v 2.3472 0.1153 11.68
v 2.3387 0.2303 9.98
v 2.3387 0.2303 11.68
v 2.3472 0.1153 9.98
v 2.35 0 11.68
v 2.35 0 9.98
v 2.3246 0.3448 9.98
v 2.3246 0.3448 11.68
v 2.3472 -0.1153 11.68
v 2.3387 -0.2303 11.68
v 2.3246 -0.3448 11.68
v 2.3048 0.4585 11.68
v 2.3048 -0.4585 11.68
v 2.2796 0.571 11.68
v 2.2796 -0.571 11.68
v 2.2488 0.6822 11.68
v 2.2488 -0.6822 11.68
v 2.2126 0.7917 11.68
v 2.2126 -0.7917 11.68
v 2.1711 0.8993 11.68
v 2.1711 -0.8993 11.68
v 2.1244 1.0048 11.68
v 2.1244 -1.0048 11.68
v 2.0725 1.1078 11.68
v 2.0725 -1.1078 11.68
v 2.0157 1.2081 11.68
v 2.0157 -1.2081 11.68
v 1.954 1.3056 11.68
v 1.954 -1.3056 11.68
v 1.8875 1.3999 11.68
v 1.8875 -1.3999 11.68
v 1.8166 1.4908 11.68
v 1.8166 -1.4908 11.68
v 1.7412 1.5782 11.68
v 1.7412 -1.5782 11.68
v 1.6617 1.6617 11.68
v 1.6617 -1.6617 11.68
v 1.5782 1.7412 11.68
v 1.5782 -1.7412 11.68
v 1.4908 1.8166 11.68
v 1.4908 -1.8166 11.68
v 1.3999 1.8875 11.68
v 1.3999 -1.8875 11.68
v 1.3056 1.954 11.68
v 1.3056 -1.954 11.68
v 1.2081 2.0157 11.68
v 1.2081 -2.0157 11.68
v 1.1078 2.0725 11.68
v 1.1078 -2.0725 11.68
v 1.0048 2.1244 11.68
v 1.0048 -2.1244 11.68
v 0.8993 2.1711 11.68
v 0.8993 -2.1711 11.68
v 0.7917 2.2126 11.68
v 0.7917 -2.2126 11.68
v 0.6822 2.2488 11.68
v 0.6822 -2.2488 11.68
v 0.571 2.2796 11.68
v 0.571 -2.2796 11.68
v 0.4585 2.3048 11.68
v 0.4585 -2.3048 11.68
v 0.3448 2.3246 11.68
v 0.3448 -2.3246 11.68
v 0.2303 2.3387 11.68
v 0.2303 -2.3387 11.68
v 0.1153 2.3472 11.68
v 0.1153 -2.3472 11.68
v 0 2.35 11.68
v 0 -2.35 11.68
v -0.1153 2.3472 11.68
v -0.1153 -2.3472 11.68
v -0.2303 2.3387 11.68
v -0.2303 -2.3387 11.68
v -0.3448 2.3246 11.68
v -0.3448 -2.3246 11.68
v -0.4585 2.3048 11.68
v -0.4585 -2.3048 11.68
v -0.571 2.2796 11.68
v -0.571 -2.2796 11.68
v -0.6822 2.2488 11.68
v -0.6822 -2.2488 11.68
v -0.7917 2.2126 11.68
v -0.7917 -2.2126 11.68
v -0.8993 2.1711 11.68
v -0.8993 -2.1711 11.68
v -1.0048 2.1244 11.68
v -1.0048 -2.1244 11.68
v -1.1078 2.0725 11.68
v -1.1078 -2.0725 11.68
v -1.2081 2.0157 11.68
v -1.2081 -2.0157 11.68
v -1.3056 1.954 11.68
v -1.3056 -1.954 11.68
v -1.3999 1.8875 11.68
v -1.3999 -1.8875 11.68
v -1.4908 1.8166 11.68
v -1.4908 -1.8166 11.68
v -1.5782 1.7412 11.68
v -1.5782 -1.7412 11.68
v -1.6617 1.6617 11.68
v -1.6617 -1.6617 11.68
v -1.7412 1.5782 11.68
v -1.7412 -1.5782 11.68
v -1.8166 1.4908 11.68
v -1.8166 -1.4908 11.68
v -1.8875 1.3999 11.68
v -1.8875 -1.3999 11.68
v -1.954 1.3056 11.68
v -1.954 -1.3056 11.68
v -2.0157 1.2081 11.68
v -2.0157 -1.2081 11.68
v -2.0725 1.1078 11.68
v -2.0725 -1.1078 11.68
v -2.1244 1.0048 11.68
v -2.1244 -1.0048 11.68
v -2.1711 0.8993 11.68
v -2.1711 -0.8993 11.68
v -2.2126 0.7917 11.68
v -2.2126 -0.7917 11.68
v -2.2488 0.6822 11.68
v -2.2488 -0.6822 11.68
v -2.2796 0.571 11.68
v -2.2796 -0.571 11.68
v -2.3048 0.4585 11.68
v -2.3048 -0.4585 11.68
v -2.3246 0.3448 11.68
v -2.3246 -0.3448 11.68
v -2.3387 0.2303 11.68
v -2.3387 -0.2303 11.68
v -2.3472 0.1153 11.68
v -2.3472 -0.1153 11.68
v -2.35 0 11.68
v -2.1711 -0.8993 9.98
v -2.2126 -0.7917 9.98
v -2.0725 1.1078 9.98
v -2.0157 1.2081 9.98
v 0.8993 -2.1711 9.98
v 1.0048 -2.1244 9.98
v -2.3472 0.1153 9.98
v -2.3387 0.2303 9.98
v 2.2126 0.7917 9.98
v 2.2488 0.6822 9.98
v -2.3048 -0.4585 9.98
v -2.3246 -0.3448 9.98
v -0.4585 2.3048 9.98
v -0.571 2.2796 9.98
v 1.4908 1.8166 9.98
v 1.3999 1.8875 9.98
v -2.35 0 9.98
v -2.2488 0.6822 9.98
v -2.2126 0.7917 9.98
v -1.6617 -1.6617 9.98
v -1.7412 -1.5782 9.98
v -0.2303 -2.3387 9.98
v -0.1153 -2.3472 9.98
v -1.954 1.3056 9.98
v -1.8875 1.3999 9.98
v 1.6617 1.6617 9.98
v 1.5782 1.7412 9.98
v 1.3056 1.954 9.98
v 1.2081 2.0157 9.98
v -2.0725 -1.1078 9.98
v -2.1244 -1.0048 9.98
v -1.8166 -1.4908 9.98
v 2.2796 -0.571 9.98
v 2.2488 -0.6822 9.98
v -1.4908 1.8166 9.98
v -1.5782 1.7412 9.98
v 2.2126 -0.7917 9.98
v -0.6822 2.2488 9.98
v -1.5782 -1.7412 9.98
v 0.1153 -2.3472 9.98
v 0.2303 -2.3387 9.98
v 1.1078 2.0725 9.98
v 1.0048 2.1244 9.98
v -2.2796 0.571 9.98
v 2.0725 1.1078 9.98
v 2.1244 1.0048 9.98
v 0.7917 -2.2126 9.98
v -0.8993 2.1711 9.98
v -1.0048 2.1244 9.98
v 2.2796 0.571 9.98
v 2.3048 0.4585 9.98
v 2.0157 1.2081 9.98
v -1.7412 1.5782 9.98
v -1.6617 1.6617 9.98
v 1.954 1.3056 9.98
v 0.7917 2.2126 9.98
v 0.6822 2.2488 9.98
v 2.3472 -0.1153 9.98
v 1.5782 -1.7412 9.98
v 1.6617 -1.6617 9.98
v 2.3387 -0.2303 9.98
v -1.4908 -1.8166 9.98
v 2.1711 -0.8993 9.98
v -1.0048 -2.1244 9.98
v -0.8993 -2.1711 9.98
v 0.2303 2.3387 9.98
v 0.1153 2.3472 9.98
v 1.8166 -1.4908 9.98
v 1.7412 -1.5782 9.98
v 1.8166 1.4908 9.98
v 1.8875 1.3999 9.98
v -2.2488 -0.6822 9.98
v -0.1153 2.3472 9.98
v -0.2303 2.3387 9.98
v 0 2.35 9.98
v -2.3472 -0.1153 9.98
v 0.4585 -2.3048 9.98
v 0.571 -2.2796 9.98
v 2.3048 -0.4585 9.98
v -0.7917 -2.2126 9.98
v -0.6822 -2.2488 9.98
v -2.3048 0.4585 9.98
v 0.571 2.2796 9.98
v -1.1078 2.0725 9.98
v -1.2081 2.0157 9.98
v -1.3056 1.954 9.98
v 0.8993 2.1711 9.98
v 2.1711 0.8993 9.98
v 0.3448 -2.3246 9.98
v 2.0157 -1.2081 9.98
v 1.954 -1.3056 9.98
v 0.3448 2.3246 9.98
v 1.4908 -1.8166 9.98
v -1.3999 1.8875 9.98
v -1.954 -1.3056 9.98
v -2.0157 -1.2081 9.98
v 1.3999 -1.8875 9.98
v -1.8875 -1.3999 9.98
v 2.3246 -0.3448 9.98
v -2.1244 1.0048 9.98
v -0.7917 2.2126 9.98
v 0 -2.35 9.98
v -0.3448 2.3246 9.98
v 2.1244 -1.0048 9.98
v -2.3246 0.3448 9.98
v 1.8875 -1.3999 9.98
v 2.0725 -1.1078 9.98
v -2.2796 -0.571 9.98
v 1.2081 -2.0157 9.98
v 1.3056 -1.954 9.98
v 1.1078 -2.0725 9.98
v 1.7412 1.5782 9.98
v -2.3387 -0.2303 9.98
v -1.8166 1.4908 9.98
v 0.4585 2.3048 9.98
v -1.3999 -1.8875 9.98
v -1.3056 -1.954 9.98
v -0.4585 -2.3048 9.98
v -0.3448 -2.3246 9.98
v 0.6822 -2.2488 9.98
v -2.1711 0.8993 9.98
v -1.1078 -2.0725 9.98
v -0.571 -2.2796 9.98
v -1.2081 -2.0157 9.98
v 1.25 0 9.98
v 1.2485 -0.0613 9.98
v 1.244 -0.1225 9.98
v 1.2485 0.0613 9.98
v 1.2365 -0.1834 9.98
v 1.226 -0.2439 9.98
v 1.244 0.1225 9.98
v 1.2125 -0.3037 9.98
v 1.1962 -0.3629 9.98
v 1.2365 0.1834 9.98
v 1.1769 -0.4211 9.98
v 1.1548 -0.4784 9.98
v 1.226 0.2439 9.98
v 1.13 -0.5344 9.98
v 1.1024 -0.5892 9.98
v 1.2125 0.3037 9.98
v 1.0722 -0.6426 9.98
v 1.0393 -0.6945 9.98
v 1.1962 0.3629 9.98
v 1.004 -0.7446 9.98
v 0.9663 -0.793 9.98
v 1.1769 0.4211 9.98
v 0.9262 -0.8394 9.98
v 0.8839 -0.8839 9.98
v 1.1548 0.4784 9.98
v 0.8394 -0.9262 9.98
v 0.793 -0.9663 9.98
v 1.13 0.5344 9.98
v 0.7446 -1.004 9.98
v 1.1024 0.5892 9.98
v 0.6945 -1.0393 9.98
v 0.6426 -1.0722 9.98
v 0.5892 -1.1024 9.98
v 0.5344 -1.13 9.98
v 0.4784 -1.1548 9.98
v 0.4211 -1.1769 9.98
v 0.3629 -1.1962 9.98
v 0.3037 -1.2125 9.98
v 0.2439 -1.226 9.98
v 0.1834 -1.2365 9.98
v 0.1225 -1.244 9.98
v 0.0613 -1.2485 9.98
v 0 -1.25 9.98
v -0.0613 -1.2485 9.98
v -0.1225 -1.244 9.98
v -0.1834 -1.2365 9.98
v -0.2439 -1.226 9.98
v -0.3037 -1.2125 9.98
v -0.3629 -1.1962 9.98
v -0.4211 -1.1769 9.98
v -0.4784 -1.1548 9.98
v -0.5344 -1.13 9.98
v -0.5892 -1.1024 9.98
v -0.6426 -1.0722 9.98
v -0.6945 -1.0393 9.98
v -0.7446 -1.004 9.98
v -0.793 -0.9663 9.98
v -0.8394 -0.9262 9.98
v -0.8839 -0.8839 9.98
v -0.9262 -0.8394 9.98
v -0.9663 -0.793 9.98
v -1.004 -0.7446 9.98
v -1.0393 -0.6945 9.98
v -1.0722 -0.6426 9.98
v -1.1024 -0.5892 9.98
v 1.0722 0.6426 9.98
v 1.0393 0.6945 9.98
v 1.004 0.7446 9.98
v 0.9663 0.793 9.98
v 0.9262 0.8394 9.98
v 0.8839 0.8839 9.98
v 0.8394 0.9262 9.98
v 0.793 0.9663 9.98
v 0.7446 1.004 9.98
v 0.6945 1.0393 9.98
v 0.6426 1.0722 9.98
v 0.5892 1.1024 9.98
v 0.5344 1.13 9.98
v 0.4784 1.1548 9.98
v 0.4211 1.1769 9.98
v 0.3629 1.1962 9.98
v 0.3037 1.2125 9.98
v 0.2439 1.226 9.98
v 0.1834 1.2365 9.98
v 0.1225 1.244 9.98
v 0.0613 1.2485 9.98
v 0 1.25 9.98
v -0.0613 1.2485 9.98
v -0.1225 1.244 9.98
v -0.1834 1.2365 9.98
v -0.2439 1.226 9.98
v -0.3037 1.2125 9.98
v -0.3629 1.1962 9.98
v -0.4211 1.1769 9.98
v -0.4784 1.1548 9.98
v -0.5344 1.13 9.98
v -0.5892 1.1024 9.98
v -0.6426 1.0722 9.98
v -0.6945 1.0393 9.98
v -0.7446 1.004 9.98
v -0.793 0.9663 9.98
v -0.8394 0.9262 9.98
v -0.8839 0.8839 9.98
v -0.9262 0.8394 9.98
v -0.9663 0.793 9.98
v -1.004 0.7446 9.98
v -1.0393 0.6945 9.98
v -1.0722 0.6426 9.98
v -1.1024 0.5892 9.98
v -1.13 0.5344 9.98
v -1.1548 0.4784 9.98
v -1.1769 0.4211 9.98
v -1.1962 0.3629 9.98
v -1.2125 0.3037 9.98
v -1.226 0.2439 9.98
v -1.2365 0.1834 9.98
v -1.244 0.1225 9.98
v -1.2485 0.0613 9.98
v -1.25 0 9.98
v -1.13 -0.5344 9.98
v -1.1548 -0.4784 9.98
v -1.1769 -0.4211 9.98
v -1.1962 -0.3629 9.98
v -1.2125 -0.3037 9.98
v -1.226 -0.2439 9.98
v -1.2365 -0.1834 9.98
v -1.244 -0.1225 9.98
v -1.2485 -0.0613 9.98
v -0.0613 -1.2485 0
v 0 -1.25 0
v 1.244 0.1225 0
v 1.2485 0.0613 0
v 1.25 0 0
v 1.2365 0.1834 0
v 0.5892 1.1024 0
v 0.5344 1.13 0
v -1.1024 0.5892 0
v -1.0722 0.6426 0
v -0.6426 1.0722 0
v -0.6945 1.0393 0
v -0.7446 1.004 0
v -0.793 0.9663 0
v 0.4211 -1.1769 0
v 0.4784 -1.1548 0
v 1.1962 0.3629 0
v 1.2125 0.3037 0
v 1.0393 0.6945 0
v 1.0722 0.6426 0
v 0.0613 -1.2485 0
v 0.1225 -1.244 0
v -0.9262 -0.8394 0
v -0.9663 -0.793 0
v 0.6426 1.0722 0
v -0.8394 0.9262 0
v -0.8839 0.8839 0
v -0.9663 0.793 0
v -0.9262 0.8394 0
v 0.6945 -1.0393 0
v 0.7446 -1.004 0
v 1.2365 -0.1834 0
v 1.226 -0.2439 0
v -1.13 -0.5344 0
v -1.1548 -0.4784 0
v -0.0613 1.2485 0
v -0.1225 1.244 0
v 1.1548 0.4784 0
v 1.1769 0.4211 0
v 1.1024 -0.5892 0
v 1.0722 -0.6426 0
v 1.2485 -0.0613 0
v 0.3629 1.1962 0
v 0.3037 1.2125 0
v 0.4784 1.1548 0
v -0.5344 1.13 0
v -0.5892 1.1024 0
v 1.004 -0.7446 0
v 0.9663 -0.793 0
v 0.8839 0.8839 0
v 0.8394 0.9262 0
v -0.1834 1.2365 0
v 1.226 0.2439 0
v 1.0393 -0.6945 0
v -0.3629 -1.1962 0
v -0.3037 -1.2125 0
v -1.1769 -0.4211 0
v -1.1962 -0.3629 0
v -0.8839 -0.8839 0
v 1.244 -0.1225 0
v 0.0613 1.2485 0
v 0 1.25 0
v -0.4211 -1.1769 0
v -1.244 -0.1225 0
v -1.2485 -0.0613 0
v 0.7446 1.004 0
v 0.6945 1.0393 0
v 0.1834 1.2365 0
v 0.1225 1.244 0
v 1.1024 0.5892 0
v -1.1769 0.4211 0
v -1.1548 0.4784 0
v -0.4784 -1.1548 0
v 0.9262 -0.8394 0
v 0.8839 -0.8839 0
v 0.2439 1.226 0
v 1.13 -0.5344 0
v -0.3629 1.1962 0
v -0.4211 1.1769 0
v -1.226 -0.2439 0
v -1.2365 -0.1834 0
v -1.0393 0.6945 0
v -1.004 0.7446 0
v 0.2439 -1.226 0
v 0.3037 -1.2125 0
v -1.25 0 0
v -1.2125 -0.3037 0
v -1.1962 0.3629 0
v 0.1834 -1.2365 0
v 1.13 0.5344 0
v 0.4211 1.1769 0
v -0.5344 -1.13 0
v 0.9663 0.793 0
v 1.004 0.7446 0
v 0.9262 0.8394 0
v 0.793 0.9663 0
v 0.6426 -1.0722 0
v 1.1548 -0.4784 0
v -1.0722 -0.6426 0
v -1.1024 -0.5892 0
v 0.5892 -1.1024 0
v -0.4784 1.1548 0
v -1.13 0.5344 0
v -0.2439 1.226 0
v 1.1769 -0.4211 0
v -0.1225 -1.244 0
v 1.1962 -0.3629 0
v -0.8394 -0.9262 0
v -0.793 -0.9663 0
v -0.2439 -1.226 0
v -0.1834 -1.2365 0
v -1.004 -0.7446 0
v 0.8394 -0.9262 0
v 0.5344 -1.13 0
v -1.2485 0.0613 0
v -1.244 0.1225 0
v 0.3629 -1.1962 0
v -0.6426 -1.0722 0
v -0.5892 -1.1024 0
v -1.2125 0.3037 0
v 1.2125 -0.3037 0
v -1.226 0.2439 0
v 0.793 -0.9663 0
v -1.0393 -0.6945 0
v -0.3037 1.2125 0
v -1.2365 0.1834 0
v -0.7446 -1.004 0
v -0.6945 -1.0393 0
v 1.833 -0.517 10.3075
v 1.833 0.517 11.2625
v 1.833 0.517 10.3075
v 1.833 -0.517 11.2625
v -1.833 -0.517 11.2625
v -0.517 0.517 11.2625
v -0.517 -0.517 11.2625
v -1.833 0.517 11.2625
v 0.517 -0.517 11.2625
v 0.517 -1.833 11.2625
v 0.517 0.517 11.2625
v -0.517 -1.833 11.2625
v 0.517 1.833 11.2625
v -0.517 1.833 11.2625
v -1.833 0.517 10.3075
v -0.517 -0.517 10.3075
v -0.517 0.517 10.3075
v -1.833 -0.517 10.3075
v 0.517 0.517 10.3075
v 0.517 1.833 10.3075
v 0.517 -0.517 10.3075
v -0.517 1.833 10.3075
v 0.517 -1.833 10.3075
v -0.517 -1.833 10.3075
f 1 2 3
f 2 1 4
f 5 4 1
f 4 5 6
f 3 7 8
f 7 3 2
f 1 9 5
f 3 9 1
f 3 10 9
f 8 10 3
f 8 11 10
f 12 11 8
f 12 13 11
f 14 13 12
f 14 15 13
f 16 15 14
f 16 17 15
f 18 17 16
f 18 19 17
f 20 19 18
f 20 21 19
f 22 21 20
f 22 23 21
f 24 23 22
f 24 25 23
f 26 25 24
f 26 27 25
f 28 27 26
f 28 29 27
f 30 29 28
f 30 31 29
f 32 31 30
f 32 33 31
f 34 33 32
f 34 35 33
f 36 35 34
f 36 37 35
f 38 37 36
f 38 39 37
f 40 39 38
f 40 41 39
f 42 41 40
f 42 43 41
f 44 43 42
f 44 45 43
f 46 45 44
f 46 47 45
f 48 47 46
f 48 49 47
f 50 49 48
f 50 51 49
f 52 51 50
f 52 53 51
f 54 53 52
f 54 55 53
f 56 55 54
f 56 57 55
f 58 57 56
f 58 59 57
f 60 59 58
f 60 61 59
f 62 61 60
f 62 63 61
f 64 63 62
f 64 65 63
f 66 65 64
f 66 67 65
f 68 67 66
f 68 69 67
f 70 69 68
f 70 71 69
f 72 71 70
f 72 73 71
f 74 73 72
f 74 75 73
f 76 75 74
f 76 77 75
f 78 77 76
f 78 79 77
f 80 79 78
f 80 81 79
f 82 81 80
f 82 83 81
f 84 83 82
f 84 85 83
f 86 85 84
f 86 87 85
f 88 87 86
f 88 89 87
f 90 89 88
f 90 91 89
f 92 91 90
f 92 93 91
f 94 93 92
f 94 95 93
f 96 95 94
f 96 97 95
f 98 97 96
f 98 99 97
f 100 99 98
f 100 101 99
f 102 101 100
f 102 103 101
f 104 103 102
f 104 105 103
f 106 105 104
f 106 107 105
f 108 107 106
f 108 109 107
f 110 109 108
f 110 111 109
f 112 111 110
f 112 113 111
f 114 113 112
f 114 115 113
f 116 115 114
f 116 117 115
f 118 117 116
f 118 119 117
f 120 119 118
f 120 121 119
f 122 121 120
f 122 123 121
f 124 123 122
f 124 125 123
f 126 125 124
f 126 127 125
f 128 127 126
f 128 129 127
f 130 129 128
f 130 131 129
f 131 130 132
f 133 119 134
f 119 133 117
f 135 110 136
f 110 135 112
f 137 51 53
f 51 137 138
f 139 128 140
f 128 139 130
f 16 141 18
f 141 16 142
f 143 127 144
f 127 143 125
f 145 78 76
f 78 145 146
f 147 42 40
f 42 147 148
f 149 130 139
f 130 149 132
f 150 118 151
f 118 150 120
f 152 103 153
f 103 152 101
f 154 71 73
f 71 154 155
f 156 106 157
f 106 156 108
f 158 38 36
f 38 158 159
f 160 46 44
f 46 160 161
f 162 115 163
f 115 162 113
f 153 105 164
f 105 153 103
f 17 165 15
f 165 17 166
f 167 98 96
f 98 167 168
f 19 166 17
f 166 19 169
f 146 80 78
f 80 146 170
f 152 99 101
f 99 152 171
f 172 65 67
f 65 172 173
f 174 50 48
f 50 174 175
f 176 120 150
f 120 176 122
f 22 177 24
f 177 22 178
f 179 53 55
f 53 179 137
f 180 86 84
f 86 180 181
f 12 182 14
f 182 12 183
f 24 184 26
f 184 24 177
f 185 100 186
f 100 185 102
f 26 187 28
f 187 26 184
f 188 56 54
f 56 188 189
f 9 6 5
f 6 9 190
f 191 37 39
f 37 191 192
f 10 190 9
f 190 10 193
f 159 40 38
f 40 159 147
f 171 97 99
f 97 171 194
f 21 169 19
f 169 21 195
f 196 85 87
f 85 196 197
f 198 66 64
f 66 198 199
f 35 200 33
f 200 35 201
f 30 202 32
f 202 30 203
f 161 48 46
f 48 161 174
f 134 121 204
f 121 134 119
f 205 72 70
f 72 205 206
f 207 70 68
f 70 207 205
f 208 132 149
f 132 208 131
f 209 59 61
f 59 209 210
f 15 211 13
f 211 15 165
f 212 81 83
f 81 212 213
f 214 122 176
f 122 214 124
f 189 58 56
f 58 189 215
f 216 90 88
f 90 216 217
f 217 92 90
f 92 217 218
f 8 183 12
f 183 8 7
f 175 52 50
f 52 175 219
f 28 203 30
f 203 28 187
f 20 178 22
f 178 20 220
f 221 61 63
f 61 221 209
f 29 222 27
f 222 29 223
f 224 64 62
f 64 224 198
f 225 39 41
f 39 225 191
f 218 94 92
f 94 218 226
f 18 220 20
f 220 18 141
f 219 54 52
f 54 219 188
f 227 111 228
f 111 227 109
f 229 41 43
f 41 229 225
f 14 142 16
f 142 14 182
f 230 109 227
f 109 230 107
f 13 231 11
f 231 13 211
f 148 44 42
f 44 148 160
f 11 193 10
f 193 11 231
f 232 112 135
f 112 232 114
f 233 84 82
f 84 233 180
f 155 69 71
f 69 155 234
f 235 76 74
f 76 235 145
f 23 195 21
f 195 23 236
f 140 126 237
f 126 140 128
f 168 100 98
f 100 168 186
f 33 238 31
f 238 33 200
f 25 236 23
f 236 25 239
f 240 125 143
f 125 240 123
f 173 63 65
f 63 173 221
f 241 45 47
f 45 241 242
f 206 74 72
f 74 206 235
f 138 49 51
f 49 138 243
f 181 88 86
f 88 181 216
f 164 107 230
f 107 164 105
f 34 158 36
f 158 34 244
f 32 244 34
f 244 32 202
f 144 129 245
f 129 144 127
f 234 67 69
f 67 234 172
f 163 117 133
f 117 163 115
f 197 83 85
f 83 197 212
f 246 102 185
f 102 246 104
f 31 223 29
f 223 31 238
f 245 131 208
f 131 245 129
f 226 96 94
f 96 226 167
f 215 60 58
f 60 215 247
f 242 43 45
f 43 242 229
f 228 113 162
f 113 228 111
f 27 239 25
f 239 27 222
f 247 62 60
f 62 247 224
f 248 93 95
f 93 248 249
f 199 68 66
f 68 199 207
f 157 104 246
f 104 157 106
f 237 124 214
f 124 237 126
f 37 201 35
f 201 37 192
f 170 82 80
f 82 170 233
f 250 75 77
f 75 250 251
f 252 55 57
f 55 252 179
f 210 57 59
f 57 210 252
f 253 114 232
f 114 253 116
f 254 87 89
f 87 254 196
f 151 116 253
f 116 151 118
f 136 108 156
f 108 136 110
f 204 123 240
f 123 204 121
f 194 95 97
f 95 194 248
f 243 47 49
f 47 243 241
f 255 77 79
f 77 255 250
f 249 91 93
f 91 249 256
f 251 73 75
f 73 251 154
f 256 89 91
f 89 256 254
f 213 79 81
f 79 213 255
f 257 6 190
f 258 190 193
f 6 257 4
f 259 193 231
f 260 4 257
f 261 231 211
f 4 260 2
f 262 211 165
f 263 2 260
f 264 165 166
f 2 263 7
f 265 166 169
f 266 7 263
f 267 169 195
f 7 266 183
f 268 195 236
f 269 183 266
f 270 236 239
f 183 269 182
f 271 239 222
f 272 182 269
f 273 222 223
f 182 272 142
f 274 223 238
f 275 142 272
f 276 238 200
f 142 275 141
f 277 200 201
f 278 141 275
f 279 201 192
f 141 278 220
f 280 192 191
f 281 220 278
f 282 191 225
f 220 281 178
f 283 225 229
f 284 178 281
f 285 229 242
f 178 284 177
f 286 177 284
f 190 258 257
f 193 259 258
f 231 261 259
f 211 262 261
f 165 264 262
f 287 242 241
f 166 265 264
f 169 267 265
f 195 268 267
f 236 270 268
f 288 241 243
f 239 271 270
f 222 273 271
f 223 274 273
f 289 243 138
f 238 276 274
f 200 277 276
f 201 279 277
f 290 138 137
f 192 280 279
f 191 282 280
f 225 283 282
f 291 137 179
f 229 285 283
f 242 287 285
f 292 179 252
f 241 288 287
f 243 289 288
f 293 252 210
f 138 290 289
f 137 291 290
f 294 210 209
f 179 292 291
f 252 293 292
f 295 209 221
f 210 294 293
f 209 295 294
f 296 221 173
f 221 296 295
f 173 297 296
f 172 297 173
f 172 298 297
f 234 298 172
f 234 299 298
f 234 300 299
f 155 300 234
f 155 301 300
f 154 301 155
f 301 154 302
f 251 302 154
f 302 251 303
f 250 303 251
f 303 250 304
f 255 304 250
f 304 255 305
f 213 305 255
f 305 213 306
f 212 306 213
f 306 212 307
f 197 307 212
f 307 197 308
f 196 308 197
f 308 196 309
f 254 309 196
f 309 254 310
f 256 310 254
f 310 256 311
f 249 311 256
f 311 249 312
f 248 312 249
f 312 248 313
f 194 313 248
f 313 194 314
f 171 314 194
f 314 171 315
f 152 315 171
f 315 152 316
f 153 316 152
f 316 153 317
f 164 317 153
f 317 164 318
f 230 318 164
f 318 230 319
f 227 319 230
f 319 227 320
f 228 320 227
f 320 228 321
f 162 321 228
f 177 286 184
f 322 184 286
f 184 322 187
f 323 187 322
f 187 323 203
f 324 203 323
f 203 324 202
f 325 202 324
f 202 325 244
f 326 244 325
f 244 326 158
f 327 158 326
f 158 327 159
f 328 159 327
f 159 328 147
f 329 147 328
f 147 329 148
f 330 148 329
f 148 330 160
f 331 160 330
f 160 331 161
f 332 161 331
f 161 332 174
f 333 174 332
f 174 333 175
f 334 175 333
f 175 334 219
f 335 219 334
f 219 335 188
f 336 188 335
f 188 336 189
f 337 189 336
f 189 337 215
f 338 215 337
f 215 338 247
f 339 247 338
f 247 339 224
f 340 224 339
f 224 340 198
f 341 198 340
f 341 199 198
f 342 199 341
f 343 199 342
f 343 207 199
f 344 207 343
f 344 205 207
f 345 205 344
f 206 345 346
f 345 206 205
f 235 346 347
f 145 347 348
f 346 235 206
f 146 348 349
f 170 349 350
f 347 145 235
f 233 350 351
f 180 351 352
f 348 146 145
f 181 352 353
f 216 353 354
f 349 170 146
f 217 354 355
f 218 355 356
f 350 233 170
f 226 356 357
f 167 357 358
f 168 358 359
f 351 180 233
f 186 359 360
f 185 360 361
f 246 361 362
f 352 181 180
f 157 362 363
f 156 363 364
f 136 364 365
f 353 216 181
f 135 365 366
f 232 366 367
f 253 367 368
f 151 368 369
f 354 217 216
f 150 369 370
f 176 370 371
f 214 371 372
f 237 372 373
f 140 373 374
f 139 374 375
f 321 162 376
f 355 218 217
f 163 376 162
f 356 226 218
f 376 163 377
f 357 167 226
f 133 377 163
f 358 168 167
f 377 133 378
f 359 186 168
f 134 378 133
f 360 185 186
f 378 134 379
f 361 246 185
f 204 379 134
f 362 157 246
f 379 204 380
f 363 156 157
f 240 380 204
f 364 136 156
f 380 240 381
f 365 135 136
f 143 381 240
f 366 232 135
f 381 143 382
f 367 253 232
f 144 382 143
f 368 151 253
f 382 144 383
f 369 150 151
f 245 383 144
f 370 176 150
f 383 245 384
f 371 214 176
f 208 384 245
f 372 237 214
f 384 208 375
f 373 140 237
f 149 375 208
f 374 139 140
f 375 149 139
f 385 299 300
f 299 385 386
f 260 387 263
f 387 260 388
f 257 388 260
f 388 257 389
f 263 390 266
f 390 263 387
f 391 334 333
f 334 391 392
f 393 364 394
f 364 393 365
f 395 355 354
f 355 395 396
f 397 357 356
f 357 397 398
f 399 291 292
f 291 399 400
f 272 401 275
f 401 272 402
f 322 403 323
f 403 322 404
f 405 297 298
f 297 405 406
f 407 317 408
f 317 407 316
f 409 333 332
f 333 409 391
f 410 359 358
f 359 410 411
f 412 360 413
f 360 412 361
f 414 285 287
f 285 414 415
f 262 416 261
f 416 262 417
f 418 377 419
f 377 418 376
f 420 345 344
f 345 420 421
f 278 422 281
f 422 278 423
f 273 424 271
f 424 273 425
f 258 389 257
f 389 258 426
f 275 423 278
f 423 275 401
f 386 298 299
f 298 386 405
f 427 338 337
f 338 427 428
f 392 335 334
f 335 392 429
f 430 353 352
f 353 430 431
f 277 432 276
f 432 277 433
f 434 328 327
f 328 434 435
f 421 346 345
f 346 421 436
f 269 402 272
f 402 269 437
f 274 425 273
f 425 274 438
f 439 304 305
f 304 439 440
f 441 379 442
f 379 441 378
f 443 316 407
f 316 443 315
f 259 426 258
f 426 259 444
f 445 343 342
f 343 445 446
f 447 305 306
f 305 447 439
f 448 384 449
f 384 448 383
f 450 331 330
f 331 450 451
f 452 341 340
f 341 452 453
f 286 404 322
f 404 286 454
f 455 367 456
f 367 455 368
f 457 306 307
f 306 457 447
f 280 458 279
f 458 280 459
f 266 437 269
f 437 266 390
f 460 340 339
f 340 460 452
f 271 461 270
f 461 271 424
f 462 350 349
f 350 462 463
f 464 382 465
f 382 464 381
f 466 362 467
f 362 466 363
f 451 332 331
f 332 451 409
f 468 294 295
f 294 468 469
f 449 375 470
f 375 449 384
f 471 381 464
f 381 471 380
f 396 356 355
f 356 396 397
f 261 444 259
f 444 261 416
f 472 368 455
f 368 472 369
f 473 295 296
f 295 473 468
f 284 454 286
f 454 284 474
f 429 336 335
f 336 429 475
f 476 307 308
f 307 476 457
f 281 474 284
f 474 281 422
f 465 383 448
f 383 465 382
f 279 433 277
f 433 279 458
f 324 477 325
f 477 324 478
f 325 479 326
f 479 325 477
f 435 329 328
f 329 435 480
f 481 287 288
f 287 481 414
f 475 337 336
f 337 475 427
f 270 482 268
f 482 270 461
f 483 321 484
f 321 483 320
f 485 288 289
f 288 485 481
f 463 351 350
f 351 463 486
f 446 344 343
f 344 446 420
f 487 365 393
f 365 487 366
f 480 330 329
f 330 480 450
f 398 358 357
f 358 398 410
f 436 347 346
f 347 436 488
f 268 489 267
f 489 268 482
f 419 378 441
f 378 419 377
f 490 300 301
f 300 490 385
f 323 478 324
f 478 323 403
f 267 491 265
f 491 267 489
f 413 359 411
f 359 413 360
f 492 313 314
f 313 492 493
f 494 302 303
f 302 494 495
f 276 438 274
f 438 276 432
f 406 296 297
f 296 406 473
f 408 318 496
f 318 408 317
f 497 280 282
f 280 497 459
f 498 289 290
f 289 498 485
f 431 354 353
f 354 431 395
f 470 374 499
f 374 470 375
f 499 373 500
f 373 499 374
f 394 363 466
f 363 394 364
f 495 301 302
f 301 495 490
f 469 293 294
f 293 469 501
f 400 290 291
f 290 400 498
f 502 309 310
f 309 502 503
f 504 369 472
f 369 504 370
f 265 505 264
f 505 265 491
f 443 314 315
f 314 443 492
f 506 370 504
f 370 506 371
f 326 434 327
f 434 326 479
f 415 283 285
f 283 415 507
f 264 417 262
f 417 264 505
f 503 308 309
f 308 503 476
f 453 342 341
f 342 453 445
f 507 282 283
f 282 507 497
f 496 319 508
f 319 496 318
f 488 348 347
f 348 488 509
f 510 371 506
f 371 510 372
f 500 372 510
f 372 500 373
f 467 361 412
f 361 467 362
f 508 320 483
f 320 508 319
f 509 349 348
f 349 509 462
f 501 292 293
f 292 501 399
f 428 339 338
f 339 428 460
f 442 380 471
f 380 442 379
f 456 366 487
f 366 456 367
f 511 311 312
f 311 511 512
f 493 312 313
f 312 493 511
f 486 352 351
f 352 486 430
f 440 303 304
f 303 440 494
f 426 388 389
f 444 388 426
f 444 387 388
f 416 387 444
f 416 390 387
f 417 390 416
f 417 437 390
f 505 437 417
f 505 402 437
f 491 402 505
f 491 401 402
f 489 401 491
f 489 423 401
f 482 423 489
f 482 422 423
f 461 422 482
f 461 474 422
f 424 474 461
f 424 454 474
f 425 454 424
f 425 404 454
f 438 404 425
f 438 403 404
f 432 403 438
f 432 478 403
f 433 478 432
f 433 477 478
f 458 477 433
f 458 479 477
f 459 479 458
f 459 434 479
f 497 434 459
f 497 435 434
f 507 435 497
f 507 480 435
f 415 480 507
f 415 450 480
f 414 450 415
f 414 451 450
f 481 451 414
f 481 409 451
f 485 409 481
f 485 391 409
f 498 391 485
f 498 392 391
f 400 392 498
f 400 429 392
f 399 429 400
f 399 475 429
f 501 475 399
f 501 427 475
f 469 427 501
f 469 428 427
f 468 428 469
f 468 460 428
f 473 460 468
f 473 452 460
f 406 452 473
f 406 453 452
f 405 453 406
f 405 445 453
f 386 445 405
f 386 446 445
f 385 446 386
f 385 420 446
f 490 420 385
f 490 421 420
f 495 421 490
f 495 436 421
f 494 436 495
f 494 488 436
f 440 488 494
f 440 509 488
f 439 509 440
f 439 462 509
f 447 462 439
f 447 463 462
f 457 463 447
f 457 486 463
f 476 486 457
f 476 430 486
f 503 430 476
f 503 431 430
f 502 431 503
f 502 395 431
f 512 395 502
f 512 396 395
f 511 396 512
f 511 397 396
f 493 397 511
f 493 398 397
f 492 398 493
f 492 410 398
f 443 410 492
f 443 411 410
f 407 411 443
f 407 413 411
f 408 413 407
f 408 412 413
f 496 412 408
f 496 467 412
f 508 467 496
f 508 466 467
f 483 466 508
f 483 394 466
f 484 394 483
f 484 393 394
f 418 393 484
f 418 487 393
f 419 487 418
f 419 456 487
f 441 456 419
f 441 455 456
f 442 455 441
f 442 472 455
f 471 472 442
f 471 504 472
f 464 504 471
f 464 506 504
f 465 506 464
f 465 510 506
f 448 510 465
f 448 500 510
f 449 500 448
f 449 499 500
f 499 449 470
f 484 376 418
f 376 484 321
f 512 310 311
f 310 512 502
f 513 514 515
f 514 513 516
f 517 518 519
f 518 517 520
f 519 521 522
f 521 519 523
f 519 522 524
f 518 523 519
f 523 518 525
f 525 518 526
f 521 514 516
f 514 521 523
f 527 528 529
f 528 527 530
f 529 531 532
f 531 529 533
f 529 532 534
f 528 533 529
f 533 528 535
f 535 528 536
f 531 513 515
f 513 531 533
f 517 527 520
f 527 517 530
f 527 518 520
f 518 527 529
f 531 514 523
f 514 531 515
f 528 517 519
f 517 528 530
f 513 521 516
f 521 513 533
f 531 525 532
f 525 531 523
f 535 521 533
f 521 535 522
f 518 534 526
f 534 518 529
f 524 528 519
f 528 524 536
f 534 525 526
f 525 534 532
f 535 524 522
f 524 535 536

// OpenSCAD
$fn = 128;

// Dimensions (mm)
shaft_d   = 2.5;
shaft_r   = shaft_d/2;
shaft_len = 10;          // under-head length

head_d = 4.7;
head_r = head_d/2;
head_h = 1.7;

// Pan head profile controls (kept within head_h)
skirt_h = head_h * 0.35;          // short straight skirt
dome_h  = head_h - skirt_h;       // domed portion height

// Drive feature (Phillips-like cross recess)
drive_depth = min(0.55*head_h, 0.95);   // recess depth
drive_w     = head_d * 0.22;            // slot width
drive_len   = head_d * 0.78;            // slot length

// Small overlap to guarantee a single connected solid / robust booleans
eps = 0.02;

module pan_head_solid(d=head_d, h=head_h, skirt=skirt_h) {
    r = d/2;
    dome = h - skirt;

    // Spherical cap: base radius a=r, cap height hh=dome
    a  = r;
    hh = dome;
    R  = (a*a + hh*hh) / (2*hh);

    union() {
        // Cylindrical skirt
        cylinder(h=skirt + eps, r=r);

        // Domed top (spherical cap)
        translate([0,0,skirt - eps])
            intersection() {
                translate([0,0, R - hh]) sphere(r=R);
                cylinder(h=hh + eps, r=a);
            }
    }
}

module cross_recess(depth=drive_depth, w=drive_w, len=drive_len) {
    // Two perpendicular rounded-ish slots (rectangular prisms)
    union() {
        translate([0,0,-depth])
            cube([len, w, depth + eps], center=true);
        translate([0,0,-depth])
            cube([w, len, depth + eps], center=true);
    }
}

module pan_head_screw() {
    difference() {
        union() {
            // Shank
            cylinder(h=shaft_len + eps, r=shaft_r);

            // Head on top of shank (connected with overlap)
            translate([0,0,shaft_len - eps])
                pan_head_solid(d=head_d, h=head_h, skirt=skirt_h);
        }

        // Drive recess cut into the top of the head
        translate([0,0,shaft_len + head_h + eps])
            cross_recess(depth=drive_depth, w=drive_w, len=drive_len);
    }
}

pan_head_screw();
